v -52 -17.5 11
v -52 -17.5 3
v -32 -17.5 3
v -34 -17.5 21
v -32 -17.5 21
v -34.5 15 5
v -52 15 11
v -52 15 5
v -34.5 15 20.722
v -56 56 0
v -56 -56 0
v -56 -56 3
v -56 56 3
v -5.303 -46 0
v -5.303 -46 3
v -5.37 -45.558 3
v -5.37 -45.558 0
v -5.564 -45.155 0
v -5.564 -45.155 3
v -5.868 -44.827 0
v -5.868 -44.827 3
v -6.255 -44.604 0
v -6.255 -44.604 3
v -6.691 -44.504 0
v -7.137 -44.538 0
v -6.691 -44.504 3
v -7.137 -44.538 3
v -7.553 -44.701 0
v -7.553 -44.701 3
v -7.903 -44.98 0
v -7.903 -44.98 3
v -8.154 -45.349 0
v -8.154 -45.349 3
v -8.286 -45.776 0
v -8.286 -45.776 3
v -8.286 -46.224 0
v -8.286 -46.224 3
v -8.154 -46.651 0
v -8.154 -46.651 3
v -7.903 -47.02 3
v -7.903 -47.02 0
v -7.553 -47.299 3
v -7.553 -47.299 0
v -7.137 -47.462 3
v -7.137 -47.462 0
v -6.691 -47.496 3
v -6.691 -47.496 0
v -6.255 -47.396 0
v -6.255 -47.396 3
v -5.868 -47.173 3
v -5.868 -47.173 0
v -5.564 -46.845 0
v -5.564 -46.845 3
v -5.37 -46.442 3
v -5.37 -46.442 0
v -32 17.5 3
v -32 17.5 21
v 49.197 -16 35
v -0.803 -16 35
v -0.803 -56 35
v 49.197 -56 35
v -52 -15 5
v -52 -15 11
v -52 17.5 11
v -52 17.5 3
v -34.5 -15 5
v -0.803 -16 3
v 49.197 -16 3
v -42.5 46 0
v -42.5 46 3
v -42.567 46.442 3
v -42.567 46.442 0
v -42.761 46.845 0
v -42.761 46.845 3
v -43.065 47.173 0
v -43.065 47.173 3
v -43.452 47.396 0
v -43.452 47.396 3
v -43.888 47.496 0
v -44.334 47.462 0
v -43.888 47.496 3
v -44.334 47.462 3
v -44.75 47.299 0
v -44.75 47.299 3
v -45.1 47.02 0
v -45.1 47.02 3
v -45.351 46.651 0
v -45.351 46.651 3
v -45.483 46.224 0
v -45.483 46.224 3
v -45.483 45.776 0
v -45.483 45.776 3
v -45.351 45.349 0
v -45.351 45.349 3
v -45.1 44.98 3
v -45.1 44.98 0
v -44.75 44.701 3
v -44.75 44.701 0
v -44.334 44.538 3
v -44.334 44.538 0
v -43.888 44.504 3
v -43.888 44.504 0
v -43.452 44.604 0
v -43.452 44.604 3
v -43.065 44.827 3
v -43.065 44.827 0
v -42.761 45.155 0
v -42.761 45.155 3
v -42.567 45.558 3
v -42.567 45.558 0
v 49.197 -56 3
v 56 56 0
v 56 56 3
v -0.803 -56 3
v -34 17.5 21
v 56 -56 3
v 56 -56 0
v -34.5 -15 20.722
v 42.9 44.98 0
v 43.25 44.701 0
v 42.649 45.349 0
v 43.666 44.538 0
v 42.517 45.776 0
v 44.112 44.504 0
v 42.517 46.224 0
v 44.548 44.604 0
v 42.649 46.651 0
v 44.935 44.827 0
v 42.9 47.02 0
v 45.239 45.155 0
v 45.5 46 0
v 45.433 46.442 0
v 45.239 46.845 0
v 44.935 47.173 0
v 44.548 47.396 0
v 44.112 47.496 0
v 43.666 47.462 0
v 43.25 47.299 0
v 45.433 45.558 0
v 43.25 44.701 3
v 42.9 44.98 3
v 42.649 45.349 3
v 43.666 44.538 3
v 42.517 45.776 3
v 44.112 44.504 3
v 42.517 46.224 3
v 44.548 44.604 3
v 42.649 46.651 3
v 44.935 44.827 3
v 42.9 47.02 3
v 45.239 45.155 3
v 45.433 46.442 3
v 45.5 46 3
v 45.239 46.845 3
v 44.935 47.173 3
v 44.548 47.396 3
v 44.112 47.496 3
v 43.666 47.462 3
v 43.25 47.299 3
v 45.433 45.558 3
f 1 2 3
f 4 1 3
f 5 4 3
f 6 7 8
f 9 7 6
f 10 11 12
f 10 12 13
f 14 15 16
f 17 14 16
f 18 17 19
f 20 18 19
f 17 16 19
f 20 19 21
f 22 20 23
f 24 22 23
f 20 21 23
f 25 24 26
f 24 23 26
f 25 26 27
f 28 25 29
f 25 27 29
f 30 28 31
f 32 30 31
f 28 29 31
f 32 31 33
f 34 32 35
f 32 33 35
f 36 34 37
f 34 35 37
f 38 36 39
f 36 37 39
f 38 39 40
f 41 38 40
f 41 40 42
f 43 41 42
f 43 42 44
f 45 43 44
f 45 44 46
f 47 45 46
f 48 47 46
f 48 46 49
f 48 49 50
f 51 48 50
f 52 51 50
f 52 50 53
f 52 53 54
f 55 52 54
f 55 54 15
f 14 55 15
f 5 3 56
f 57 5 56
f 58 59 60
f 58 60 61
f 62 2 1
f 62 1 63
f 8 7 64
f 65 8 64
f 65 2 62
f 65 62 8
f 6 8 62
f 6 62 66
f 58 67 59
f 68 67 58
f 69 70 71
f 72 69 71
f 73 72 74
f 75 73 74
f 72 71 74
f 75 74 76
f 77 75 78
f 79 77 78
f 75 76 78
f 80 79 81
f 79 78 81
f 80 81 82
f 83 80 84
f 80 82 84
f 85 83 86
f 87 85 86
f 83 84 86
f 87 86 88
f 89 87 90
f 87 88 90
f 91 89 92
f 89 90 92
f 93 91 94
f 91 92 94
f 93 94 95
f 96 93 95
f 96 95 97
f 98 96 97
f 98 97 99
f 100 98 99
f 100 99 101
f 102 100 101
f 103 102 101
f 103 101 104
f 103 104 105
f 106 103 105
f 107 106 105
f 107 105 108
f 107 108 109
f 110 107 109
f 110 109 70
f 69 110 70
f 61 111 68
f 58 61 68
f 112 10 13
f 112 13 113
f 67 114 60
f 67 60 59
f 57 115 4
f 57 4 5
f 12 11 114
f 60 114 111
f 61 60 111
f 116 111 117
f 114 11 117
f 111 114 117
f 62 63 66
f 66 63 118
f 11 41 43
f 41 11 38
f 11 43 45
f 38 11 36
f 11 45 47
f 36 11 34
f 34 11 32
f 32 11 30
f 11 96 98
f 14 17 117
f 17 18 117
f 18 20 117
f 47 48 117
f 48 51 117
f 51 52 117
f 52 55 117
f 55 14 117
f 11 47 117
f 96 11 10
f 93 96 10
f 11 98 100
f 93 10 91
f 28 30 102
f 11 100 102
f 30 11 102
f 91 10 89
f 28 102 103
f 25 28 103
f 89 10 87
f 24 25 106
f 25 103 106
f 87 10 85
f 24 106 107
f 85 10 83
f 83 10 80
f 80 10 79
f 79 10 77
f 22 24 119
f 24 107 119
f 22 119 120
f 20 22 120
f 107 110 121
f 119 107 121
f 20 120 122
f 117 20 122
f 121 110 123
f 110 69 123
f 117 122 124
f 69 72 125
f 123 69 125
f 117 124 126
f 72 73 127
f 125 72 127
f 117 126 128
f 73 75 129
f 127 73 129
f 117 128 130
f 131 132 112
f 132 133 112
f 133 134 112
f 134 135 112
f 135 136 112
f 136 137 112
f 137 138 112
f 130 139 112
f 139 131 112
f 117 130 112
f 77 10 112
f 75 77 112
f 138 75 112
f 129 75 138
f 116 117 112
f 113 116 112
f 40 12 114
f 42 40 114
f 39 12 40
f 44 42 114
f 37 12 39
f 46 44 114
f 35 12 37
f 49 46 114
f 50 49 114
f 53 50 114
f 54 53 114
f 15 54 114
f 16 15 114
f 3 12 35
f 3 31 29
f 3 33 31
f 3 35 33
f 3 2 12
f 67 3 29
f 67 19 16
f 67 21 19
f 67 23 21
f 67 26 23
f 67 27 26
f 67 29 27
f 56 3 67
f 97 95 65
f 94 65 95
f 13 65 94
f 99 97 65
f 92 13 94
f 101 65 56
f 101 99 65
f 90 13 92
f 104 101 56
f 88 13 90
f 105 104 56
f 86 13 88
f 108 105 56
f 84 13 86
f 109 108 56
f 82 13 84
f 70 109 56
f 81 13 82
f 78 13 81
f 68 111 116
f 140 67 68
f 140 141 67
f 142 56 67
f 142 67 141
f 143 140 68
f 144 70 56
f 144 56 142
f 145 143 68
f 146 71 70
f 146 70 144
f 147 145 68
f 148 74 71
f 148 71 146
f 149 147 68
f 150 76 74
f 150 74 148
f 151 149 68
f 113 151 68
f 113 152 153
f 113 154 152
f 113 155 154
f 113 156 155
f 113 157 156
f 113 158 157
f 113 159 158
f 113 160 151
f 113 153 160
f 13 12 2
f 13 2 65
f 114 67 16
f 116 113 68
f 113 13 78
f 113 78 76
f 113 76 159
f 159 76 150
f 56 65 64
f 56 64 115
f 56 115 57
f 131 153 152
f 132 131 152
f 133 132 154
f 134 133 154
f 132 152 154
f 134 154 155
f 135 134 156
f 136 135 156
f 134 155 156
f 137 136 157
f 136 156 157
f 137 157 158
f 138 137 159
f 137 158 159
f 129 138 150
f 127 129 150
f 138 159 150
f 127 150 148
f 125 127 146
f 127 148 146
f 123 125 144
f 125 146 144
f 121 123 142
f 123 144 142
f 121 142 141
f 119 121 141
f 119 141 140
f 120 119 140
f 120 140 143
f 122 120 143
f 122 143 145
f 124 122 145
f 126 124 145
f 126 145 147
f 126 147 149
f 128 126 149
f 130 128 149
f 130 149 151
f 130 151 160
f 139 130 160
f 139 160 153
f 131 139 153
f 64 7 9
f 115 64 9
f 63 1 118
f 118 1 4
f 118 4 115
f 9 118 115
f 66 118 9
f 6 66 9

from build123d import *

# Parameters (mm, degrees)
CROQUIS1_W              = 112
CROQUIS1_H              = 112
SALIENTE_EXTRUIR1_DEPTH = 3
CROQUIS2_W              = 50
CROQUIS2_H              = 40
SALIENTE_EXTRUIR2_DEPTH = 32
CROQUIS3_W              = 20
CROQUIS3_H              = 35
SALIENTE_EXTRUIR3_DEPTH = 18
CROQUIS4_W              = 17.5
CROQUIS4_H              = 30
CORTAR_EXTRUIR1_DEPTH   = 16
CORTAR_EXTRUIR2_DEPTH   = 46
CROQUIS6_R              = 1.5
CORTAR_EXTRUIR3_DEPTH   = 46


with BuildPart() as part:
    # Croquis1 → Saliente-Extruir1 (new body)
    with BuildSketch(Plane.XY):
        Rectangle(CROQUIS1_W, CROQUIS1_H)
    extrude(amount=SALIENTE_EXTRUIR1_DEPTH)

    # Croquis2 → Saliente-Extruir2 (add)
    with BuildSketch(Plane.XY.offset(3)):
        with Locations((24.197, -36)):
            Rectangle(CROQUIS2_W, CROQUIS2_H)
    extrude(amount=SALIENTE_EXTRUIR2_DEPTH)

    # Croquis3 → Saliente-Extruir3 (add)
    with BuildSketch(Plane.XY.offset(3)):
        with Locations((-42, 0)):
            Rectangle(CROQUIS3_W, CROQUIS3_H)
    extrude(amount=SALIENTE_EXTRUIR3_DEPTH)

    # Croquis4 → Cortar-Extruir1 (cut)
    with BuildSketch(Plane.XY.offset(21)):
        with Locations((-43.25, 0)):
            Rectangle(CROQUIS4_W, CROQUIS4_H)
    extrude(amount=-CORTAR_EXTRUIR1_DEPTH, mode=Mode.SUBTRACT)

    # Croquis5 → Cortar-Extruir2 (cut)
    with BuildSketch(Plane.XZ.offset(17.5)):
        Polygon((-52, 21), (-52, 11), (-34.000297752, 21), align=None)
    extrude(amount=-CORTAR_EXTRUIR2_DEPTH, mode=Mode.SUBTRACT)

    # Croquis6 → Cortar-Extruir3 (cut)
    with BuildSketch(Plane.XY.offset(3)):
        with Locations((-44, 46)):
            Circle(CROQUIS6_R)
        with Locations((44, 46)):
            Circle(CROQUIS6_R)
        with Locations((-6.803, -46)):
            Circle(CROQUIS6_R)
    extrude(amount=-CORTAR_EXTRUIR3_DEPTH, mode=Mode.SUBTRACT)


solid = part.part
